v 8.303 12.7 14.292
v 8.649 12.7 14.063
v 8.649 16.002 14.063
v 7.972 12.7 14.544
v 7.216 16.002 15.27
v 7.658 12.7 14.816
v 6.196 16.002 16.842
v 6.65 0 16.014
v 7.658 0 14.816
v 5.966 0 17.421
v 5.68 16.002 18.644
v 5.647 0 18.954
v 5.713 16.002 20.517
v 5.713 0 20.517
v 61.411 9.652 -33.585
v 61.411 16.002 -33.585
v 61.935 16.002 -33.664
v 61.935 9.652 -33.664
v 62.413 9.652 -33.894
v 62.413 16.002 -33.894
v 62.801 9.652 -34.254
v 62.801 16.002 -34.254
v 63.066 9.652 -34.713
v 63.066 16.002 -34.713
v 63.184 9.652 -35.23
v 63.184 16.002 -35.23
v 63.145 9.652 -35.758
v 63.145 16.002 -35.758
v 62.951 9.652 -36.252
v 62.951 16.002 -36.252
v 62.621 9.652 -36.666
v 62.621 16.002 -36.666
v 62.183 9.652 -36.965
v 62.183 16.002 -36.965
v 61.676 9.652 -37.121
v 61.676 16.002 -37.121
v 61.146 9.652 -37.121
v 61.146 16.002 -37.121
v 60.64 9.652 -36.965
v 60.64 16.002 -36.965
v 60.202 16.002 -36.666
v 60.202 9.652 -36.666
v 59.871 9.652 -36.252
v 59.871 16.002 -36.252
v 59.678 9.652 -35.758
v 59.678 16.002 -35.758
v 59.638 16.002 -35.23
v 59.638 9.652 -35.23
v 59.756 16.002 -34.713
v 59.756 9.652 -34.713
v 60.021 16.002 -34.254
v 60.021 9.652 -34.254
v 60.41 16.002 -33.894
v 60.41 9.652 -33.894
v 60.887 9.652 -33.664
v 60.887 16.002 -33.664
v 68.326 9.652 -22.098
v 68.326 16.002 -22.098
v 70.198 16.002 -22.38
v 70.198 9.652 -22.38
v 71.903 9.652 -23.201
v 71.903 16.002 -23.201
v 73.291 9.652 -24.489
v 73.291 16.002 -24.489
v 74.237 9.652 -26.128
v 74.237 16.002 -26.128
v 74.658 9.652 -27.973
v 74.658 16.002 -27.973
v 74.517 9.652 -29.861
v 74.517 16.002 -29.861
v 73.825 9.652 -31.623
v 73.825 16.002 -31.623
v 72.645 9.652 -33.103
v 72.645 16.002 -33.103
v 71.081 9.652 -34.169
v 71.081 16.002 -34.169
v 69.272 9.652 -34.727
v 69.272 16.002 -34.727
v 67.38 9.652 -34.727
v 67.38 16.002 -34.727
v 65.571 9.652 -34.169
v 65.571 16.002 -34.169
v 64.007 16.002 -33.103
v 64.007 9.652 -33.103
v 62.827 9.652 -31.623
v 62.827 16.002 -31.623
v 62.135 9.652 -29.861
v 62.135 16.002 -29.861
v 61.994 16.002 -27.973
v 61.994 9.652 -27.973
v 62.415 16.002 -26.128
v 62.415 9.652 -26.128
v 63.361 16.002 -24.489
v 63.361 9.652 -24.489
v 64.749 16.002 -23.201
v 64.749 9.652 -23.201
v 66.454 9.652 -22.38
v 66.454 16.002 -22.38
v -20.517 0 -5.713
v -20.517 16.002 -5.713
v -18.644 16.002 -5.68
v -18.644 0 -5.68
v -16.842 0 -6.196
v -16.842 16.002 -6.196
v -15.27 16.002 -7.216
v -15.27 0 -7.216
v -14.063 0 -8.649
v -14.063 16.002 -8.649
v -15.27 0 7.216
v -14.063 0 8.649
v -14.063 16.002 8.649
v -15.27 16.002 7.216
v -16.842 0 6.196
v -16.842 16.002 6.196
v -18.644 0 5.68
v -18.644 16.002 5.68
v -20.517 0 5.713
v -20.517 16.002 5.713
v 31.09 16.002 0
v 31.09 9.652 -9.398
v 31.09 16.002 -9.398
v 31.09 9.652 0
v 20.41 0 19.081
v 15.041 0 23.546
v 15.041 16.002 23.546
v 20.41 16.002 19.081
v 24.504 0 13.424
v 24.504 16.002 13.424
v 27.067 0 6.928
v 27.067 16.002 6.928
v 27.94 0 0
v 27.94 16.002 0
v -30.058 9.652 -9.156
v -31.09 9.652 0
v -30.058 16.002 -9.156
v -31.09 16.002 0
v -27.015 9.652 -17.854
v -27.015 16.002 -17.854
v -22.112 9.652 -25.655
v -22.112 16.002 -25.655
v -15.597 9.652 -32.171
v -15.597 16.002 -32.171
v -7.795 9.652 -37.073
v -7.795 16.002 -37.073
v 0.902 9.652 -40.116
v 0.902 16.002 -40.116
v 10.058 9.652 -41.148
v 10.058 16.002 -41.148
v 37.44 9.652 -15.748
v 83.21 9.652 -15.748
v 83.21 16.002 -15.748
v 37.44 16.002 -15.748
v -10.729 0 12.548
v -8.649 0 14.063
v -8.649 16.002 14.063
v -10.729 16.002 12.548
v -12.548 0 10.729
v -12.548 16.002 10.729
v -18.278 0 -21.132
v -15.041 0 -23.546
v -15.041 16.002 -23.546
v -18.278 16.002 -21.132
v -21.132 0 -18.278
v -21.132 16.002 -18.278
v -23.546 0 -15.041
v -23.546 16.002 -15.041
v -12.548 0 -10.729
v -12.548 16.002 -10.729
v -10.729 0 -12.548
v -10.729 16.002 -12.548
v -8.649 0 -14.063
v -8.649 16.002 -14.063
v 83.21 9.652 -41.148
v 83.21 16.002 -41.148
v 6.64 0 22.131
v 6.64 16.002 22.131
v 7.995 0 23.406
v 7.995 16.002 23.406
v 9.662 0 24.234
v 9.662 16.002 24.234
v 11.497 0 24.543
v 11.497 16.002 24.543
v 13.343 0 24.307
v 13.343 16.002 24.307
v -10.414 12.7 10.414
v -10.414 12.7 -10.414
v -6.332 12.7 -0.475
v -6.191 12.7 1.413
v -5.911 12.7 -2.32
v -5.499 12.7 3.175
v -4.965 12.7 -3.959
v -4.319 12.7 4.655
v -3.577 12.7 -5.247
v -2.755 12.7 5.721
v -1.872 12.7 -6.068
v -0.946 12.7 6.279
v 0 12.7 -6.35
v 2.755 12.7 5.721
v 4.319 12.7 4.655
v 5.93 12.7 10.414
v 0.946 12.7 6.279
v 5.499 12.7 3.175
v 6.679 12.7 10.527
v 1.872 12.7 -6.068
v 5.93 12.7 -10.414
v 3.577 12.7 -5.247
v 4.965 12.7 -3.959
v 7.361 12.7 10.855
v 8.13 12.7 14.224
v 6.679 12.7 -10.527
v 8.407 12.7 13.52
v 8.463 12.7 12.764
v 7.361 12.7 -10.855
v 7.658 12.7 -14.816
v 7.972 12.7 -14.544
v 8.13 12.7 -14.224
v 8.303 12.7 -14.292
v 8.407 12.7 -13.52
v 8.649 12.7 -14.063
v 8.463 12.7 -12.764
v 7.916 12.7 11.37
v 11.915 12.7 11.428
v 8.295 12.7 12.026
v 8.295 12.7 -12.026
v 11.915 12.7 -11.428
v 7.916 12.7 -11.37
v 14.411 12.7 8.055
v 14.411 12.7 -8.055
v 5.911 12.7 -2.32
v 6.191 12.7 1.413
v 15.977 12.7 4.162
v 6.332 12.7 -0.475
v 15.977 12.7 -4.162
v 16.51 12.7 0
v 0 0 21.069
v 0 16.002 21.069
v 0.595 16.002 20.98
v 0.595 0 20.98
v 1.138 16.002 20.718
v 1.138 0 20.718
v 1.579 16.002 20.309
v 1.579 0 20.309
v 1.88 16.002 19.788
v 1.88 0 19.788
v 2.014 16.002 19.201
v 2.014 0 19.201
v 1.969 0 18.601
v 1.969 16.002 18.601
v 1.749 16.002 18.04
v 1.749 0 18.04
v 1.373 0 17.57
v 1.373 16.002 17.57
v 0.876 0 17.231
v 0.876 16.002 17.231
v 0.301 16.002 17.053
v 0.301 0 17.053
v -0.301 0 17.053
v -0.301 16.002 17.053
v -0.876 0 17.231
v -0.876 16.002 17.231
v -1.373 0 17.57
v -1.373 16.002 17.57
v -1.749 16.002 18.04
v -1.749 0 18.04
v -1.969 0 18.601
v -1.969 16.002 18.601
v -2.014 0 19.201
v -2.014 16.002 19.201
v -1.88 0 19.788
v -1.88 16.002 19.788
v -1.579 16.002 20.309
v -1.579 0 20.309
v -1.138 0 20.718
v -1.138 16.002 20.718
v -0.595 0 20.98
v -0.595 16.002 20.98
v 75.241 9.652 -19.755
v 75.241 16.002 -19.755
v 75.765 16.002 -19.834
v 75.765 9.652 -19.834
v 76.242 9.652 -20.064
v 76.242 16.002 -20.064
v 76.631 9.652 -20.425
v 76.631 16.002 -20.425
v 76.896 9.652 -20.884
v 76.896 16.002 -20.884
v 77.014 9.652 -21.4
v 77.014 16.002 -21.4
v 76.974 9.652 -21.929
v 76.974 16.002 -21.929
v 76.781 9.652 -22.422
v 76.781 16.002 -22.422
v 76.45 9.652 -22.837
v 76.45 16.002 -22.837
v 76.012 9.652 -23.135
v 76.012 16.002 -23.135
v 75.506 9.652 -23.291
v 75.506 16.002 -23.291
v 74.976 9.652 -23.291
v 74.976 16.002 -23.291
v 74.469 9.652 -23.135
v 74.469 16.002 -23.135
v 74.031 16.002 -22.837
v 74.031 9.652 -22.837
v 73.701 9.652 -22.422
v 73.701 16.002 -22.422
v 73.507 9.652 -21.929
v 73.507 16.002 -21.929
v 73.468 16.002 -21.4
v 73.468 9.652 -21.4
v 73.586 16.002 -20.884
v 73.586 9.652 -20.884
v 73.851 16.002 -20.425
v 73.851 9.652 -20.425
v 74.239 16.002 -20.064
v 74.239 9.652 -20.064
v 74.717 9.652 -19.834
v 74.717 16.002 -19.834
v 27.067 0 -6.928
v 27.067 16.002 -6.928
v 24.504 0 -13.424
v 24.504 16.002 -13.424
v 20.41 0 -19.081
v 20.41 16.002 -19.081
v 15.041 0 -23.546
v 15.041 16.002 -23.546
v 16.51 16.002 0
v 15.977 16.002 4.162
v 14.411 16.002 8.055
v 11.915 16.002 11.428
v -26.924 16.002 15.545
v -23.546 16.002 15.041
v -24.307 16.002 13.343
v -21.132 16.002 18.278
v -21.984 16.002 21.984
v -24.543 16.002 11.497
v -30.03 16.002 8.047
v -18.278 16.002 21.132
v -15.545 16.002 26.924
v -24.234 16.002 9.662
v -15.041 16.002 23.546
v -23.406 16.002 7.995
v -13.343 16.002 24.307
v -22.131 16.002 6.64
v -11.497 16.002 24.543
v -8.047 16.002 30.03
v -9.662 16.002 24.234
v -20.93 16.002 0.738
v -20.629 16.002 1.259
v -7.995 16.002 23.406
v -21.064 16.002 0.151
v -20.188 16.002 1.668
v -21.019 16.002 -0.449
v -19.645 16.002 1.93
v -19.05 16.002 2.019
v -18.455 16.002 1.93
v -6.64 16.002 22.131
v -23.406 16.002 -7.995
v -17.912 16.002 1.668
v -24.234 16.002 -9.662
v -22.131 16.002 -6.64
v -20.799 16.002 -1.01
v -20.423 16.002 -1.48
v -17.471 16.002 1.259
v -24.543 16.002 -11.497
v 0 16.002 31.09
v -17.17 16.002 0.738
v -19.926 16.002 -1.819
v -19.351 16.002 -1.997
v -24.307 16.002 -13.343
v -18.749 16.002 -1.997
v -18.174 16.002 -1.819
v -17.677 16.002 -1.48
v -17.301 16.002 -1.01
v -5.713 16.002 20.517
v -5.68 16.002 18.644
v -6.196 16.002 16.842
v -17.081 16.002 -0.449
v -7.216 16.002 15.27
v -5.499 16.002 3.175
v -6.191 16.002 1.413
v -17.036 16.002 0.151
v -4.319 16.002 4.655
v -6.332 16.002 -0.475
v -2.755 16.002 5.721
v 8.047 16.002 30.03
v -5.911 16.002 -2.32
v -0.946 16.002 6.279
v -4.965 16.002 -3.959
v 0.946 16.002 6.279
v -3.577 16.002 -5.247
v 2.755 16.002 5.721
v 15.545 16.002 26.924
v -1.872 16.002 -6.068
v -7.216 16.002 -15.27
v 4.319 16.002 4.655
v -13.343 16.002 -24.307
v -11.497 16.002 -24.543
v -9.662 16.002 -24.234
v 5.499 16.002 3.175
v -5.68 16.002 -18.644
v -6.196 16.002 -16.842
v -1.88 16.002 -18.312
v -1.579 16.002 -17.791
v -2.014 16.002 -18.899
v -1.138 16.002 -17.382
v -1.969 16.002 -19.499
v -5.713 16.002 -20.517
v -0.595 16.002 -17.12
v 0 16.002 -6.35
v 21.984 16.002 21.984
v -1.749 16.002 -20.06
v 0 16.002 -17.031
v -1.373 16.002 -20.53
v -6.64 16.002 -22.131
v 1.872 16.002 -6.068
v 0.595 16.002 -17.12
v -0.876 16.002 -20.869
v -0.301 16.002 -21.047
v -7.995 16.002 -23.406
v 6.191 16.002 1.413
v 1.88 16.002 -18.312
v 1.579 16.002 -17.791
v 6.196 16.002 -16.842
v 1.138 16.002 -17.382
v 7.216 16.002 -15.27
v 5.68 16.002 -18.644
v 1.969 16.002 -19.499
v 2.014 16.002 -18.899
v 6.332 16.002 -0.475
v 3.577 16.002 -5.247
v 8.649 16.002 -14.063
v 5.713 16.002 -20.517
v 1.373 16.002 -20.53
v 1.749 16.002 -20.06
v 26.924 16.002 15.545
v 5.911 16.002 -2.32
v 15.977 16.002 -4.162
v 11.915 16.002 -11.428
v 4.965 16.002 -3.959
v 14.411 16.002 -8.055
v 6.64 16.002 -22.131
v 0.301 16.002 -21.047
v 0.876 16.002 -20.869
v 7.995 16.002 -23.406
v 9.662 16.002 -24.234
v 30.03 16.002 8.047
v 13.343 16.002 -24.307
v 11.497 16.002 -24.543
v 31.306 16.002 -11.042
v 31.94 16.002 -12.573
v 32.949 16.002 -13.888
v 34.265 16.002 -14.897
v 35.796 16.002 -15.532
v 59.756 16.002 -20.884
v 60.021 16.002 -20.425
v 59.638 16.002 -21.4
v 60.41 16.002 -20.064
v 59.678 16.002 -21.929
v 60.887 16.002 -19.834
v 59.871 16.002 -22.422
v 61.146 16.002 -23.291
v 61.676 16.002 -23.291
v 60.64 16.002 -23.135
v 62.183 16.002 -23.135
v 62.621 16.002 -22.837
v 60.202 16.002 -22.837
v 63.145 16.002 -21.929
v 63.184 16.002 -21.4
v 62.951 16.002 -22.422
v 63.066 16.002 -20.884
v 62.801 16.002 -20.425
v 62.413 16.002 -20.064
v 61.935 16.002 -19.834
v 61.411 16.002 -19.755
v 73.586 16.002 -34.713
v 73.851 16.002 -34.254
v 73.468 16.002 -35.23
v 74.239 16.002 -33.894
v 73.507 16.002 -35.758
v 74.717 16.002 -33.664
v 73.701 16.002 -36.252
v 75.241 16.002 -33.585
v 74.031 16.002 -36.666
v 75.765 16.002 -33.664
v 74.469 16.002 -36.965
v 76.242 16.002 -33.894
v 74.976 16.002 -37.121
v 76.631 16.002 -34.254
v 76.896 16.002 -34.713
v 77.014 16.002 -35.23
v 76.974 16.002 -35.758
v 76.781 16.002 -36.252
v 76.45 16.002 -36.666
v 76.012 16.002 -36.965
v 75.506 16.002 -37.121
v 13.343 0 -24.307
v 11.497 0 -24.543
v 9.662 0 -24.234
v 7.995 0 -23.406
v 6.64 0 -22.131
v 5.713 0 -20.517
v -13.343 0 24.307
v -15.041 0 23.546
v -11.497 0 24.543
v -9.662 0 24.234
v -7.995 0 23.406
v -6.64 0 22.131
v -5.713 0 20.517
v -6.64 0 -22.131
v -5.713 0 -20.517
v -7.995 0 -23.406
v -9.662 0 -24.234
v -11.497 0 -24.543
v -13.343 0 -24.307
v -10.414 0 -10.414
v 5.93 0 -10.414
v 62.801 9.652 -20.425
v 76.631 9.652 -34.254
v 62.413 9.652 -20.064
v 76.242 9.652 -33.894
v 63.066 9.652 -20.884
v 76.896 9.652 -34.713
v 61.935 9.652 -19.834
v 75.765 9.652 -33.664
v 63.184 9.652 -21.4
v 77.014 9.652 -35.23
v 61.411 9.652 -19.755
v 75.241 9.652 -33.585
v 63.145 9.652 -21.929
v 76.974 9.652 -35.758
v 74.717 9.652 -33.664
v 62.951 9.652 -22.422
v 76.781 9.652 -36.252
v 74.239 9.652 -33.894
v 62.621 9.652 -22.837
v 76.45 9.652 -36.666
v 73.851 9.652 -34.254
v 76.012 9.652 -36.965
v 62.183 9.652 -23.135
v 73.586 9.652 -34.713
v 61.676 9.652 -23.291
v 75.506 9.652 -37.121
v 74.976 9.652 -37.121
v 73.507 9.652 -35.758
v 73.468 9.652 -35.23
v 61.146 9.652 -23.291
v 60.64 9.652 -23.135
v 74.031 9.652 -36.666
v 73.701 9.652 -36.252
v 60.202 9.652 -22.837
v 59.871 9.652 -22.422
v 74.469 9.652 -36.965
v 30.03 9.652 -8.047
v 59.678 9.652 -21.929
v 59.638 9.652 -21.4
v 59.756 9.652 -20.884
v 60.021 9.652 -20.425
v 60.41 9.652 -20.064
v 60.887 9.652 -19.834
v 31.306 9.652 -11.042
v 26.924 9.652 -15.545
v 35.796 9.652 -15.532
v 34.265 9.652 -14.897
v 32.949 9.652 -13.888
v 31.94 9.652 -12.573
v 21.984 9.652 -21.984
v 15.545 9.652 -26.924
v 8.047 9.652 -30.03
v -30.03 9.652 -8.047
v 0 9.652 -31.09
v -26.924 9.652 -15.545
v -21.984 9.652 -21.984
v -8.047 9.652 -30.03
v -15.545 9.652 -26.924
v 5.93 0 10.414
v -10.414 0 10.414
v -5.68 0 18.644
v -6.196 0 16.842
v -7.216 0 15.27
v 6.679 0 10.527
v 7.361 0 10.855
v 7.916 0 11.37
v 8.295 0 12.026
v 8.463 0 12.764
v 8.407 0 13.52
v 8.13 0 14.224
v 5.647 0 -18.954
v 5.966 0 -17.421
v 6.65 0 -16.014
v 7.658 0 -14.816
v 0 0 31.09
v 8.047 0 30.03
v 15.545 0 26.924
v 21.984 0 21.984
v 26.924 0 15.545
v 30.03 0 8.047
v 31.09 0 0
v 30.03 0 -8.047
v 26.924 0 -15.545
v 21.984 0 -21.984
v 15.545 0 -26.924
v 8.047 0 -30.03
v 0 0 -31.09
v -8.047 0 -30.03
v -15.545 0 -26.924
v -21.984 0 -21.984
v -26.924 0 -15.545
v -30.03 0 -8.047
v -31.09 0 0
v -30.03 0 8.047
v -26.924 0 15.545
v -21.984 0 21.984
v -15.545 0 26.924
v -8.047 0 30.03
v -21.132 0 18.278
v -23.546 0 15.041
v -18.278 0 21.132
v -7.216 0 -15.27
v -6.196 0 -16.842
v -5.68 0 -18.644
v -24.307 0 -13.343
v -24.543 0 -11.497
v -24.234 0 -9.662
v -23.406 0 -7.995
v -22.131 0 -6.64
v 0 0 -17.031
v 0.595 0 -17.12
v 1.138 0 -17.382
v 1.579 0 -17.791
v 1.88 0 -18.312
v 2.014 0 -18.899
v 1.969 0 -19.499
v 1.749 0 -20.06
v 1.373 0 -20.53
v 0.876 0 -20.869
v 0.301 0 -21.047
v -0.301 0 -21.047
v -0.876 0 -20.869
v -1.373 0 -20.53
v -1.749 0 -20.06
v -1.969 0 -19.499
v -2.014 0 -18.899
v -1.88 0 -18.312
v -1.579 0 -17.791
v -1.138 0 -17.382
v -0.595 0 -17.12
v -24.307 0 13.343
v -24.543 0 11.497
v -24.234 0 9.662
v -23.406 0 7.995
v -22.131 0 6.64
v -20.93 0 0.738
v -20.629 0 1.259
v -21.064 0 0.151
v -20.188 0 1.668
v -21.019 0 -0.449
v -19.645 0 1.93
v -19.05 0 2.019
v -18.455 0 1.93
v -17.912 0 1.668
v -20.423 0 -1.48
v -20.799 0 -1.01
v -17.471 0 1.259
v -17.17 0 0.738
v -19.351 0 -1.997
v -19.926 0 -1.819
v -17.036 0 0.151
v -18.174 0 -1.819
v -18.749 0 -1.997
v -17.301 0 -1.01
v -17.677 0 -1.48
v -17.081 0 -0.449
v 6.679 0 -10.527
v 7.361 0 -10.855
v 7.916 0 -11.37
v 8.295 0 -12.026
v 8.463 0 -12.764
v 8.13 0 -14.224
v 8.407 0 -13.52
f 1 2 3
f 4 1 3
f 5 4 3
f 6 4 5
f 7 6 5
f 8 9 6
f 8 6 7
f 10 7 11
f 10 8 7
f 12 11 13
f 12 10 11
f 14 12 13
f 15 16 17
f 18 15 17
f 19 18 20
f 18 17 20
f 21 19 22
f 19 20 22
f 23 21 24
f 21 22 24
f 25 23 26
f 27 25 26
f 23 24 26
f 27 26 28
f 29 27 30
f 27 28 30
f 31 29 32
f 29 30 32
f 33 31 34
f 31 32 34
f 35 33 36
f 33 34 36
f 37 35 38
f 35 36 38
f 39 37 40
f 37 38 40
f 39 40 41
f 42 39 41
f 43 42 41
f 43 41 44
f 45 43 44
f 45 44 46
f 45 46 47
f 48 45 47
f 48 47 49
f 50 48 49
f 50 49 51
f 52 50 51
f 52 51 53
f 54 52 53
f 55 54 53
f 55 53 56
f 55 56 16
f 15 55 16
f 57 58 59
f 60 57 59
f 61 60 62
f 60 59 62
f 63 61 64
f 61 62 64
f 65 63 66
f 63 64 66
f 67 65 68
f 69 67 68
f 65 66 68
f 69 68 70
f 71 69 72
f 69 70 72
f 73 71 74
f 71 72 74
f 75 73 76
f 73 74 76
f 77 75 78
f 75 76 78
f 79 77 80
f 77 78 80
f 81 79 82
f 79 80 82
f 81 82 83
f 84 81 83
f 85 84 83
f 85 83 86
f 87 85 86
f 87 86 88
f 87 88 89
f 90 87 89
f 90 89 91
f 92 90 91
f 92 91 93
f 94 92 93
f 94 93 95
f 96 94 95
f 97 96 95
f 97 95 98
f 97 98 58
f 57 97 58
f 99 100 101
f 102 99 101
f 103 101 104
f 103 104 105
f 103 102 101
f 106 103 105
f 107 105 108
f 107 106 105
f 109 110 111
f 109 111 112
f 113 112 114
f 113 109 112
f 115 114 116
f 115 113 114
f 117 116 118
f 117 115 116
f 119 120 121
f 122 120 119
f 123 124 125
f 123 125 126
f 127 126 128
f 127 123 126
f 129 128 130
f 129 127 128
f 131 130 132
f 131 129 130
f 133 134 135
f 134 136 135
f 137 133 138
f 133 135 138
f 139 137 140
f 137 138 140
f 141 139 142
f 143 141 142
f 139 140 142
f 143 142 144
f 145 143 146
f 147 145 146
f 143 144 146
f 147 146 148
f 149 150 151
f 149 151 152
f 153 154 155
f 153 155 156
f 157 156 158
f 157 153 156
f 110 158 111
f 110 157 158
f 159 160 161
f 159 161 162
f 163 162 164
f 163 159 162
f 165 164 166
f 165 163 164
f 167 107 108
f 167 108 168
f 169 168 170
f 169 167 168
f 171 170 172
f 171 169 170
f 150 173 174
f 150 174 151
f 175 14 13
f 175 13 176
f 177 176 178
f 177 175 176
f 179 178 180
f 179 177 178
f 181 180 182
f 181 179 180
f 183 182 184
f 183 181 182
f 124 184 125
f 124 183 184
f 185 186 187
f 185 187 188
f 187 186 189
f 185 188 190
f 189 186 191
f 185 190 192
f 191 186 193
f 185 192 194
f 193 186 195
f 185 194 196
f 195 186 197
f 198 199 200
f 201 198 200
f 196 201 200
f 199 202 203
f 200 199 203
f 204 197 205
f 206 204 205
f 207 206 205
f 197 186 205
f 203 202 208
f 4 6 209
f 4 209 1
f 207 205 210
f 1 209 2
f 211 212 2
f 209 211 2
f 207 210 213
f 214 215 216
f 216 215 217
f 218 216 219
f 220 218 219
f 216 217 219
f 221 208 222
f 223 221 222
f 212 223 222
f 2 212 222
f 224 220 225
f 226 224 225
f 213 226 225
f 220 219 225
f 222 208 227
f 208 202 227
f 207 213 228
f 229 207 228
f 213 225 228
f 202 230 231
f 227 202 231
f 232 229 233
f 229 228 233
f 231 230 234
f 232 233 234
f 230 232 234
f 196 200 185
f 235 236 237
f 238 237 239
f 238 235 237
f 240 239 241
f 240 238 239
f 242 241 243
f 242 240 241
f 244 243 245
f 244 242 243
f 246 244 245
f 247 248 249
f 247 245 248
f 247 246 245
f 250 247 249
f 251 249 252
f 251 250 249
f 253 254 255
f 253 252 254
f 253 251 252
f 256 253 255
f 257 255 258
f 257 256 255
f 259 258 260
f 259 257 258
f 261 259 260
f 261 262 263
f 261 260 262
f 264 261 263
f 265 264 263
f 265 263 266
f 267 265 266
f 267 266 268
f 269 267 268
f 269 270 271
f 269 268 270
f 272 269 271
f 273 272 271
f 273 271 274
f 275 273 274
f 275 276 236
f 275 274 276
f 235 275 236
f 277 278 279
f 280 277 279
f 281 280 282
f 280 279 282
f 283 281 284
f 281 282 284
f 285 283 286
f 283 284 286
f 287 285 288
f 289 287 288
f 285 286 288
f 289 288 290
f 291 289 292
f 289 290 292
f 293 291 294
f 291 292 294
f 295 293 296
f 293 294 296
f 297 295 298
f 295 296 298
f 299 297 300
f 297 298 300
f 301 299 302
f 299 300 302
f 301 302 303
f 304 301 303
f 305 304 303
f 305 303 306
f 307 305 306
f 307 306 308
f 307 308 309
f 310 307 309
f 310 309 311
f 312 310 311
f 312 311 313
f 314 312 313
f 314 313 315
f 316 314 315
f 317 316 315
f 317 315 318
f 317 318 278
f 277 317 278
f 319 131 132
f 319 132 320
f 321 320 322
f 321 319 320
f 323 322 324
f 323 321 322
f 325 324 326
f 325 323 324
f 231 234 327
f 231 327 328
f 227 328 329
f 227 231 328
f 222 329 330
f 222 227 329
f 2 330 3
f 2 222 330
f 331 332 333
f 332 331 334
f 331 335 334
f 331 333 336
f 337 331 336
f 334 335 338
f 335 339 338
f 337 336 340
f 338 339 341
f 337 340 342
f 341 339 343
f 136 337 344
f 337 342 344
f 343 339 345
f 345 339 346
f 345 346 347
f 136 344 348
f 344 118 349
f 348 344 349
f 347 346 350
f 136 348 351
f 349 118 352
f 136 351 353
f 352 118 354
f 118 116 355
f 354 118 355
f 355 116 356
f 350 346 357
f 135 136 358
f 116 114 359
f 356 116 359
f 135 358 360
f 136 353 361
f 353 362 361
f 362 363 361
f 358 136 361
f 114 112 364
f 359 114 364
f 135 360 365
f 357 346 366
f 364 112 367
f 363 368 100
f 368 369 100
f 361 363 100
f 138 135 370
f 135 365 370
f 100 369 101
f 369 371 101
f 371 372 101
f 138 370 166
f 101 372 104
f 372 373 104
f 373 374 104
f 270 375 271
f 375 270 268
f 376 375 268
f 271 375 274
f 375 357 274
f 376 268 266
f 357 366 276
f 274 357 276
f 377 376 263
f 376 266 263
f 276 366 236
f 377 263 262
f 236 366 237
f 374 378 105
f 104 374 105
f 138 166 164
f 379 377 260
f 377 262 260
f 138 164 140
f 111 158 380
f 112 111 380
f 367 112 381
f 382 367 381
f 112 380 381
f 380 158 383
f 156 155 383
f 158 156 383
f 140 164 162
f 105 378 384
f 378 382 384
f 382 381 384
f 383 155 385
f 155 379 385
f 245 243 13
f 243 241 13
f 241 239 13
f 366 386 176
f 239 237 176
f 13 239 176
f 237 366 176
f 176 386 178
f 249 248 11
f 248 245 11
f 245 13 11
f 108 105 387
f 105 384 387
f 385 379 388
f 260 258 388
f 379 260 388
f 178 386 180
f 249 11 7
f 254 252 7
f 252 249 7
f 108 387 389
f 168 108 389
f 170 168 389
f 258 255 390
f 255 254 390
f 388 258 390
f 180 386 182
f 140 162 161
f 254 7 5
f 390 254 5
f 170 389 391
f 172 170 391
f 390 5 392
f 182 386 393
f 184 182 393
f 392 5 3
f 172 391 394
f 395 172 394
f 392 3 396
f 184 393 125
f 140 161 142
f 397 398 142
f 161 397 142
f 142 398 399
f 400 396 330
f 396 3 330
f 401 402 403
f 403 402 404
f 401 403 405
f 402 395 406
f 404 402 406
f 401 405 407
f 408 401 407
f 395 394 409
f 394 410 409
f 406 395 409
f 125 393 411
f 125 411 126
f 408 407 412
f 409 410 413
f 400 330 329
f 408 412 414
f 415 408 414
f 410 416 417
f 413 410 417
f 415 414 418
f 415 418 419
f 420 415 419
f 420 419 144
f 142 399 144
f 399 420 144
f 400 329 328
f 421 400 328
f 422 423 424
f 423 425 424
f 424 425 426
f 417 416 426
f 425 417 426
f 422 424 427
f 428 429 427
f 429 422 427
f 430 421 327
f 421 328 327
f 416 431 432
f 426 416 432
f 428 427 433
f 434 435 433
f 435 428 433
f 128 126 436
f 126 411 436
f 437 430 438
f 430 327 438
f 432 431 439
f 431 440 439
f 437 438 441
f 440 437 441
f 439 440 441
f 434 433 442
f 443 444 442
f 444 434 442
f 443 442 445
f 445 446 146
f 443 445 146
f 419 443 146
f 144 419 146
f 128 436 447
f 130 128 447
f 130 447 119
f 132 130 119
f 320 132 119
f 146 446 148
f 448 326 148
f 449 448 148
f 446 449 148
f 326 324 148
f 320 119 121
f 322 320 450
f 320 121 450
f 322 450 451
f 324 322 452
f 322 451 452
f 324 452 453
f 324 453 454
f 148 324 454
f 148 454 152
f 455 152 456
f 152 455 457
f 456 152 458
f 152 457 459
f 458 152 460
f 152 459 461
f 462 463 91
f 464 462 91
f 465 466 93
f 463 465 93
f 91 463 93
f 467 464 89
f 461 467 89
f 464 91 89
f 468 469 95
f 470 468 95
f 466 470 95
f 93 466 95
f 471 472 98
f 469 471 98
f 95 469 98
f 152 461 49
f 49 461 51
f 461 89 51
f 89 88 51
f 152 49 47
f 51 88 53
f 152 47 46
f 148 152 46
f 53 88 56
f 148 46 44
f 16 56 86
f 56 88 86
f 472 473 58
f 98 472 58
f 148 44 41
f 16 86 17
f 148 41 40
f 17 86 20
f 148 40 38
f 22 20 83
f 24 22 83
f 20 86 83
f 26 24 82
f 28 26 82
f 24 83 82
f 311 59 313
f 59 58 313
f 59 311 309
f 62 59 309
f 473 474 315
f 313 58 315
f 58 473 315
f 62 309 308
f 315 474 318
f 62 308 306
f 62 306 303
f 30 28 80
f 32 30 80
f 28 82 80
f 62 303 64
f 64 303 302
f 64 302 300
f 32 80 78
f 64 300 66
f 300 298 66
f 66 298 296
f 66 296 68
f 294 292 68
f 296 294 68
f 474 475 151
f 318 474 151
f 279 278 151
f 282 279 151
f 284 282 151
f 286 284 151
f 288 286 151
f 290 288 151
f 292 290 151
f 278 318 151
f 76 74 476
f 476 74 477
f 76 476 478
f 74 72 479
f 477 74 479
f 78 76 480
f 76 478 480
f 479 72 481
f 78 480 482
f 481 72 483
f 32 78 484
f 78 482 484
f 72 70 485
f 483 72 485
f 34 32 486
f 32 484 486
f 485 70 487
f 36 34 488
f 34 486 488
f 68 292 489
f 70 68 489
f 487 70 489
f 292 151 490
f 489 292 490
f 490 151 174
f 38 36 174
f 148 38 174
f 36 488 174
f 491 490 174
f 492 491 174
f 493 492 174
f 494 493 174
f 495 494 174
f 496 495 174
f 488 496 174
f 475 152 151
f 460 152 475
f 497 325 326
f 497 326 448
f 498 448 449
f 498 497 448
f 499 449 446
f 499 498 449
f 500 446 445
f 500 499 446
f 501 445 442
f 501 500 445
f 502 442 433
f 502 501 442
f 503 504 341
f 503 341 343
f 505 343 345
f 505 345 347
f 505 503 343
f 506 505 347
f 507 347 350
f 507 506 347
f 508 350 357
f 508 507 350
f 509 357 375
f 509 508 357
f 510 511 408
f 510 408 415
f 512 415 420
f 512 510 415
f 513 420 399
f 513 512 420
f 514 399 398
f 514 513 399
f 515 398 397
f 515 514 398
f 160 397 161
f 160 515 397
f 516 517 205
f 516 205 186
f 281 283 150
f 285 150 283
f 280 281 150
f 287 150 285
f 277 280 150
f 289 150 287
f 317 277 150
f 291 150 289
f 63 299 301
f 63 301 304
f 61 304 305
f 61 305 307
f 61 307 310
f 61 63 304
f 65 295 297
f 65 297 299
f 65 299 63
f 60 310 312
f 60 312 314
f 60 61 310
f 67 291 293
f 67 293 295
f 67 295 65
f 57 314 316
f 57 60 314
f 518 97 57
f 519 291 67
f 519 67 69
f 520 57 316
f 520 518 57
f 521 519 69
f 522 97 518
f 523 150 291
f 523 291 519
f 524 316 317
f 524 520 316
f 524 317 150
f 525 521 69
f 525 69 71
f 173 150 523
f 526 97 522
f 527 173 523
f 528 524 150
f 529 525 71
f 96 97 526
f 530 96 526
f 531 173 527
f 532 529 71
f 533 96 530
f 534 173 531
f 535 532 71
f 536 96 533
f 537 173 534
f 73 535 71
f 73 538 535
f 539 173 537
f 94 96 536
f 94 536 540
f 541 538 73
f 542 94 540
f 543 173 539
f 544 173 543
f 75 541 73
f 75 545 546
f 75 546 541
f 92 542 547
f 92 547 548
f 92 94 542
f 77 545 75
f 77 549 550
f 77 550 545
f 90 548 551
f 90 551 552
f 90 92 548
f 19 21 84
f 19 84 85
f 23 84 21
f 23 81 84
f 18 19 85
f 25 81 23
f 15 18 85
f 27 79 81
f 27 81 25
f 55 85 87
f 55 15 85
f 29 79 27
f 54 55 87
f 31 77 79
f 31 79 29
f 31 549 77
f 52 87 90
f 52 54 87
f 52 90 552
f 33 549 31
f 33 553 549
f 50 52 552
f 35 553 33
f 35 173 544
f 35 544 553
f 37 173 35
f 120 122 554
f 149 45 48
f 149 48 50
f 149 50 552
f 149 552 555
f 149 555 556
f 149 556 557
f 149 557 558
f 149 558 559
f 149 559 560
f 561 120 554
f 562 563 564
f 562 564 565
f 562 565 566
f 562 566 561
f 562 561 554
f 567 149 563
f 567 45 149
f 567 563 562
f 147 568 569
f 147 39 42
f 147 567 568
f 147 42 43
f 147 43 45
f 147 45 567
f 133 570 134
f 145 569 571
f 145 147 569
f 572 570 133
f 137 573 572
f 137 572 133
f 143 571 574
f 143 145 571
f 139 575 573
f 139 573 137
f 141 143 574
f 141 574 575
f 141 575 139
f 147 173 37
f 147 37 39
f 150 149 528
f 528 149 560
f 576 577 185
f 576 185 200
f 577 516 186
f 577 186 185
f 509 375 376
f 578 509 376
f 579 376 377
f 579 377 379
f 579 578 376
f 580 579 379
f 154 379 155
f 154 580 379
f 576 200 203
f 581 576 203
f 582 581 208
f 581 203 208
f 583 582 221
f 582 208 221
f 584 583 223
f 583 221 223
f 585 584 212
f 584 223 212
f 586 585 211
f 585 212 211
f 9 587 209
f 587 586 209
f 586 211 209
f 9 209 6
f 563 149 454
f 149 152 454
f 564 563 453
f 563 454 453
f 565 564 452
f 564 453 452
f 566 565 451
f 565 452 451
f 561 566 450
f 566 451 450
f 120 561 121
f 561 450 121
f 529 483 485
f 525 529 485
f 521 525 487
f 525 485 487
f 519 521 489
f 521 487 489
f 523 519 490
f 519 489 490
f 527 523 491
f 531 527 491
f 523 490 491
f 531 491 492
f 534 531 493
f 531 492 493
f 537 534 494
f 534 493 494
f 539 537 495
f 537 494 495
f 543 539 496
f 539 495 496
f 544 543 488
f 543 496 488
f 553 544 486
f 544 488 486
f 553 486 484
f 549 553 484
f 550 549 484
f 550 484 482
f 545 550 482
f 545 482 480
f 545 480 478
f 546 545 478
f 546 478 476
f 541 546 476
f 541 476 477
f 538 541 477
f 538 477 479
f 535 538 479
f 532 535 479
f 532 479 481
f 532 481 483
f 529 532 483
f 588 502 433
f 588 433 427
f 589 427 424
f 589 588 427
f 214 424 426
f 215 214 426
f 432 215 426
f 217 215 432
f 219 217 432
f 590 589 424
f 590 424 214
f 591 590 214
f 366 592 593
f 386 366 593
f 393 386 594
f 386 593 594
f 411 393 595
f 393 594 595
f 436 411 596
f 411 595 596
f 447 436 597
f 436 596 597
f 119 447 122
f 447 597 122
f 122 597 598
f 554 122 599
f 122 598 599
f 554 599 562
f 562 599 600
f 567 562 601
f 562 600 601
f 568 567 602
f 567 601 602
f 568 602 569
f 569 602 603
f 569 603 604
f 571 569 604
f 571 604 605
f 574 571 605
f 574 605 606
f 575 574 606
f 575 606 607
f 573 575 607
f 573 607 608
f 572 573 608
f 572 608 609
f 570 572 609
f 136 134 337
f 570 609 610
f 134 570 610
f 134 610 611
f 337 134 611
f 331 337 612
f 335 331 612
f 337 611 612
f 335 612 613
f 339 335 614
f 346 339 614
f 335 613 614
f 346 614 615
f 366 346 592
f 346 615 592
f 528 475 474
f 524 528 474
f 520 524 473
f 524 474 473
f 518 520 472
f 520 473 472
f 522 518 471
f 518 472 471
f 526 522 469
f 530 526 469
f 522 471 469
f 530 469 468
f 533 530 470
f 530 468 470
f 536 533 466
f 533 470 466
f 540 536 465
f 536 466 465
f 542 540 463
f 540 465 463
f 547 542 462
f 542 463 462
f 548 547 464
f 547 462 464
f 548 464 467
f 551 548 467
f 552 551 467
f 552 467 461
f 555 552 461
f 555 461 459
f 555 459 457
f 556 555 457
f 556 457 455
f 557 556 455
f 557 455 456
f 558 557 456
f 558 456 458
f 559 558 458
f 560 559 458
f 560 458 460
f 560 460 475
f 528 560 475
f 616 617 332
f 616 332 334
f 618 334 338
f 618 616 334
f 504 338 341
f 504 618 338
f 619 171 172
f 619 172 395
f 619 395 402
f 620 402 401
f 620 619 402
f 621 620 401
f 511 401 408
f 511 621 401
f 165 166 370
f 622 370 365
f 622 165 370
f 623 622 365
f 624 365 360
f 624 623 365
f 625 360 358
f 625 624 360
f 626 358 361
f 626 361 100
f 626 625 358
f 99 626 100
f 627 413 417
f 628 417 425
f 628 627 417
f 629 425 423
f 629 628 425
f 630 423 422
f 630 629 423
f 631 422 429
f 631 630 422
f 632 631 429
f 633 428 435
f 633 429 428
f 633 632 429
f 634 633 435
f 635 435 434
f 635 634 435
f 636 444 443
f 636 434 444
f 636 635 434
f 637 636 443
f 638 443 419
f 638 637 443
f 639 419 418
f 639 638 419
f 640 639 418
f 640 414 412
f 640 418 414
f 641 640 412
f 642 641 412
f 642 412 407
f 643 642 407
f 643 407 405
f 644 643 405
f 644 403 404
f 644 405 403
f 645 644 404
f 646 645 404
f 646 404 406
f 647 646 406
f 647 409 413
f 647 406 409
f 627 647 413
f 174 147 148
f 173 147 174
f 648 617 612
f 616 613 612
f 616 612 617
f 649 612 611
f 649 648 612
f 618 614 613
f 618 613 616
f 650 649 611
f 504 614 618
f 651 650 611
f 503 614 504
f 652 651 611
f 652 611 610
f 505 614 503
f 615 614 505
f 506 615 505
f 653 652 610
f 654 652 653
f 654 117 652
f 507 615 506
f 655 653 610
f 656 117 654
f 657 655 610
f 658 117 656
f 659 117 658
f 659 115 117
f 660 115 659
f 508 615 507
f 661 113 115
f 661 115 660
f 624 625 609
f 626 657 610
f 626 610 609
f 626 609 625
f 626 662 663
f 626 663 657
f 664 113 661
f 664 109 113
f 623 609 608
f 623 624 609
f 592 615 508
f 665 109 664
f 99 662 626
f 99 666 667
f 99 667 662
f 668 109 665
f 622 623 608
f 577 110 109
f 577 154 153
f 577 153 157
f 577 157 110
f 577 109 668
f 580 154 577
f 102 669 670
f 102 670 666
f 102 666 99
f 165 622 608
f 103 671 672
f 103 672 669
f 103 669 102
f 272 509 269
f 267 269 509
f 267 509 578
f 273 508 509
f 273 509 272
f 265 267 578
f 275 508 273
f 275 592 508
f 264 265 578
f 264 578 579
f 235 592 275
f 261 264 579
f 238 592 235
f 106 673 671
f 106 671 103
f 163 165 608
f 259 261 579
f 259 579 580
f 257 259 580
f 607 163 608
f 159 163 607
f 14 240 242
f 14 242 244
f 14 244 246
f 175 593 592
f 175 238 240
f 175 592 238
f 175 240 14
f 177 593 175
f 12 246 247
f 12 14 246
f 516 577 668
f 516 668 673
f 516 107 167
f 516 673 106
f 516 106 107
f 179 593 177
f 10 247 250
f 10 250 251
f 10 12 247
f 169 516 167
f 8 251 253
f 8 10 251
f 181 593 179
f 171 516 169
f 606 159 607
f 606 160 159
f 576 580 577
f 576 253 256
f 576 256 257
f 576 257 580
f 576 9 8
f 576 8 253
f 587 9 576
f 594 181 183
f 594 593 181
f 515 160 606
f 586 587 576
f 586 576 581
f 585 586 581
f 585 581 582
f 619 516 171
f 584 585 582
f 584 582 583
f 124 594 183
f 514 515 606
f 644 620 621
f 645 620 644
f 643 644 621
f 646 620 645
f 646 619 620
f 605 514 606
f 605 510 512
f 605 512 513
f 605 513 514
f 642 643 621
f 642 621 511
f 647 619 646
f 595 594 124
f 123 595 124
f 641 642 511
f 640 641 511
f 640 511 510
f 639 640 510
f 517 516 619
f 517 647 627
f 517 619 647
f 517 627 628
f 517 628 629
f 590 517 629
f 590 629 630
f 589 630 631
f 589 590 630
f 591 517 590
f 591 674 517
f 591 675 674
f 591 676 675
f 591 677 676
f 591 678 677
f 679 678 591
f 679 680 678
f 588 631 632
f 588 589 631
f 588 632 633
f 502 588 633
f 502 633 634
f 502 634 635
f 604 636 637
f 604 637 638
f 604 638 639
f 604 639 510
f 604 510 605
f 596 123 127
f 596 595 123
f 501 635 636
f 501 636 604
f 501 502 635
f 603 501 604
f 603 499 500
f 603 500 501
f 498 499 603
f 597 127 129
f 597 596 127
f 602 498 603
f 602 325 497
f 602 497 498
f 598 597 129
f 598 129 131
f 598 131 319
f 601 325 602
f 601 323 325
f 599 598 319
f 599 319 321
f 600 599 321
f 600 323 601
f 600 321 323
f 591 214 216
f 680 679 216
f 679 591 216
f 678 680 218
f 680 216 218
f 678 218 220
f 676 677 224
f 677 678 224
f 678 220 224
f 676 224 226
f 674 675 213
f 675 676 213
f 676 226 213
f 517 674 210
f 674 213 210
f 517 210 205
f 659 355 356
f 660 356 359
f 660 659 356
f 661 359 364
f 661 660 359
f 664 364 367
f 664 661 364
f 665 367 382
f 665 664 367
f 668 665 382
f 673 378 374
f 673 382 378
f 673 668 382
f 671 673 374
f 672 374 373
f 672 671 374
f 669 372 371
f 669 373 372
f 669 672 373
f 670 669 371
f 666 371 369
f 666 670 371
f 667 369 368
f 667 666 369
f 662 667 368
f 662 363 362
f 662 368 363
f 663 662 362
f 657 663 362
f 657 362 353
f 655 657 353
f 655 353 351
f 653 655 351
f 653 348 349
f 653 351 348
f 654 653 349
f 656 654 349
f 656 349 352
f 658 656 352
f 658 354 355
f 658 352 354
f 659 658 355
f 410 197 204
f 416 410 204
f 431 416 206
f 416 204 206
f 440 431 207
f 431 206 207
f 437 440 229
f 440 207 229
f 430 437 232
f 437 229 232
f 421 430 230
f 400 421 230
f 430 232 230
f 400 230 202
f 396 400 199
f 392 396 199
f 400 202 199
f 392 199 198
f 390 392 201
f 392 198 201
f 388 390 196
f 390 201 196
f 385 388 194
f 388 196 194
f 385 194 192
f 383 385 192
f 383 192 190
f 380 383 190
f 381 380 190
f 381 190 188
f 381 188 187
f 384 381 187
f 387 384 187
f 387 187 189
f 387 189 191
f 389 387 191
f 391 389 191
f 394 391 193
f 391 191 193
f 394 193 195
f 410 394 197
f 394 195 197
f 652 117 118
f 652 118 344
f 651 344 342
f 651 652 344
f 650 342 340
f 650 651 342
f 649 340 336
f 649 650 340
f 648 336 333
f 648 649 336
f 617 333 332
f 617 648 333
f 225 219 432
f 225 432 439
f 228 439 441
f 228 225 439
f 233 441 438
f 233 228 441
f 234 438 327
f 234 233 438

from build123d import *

# Parameters (mm, degrees)
SKETCH1_R           = 31.0896
BOSS_EXTRUDE1_DEPTH = 16.002
BOSS_EXTRUDE2_START = -6.35
BOSS_EXTRUDE2_DEPTH = 6.35
FILLET2_R           = 6.35
CUT_EXTRUDE2_REACH  = 96.198
SKETCH4_R           = 1.778
SKETCH4_R_2         = 6.35
SKETCH7_R           = 2.0193
CUT_EXTRUDE4_DEPTH  = 95.197625109
FILLET7_R           = 6.35
FILLET8_R           = 41.148
CUT_EXTRUDE5_DEPTH  = 12.7
FILLET9_R           = 2.54
SKETCH9_R           = 6.35
CUT_EXTRUDE6_DEPTH  = 3.302


# Some blends are built 0.0001 mm under size
with BuildPart() as part:
    # Sketch1 → Boss-Extrude1 (new body)
    with BuildSketch(Plane(origin=(0, 0, 0), x_dir=(1, 0, 0), z_dir=(0, 1, 0))):
        with Locations(Location((0, 0, 0), (0, 0, 270))):
            Circle(SKETCH1_R)
    extrude(amount=BOSS_EXTRUDE1_DEPTH)

    # Sketch2 → Boss-Extrude2 (add)
    with BuildSketch(Plane(origin=(0, 16.002, 0), x_dir=(1, 0, 0), z_dir=(0, 1, 0)).offset(BOSS_EXTRUDE2_START)):
        with BuildLine():
            Line((-31.0896, 0), (-31.0896, 41.148))
            Line((-31.0896, 41.148), (83.2104, 41.148))
            Line((83.2104, 41.148), (83.2104, 15.748))
            Line((83.2104, 15.748), (31.0896, 15.748))
            Line((31.0896, 15.748), (31.0896, 0))
            ThreePointArc((31.0896, 0), (0, -31.0896), (-31.0896, 0))
        make_face()
    extrude(amount=BOSS_EXTRUDE2_DEPTH)

    # Fillet2
    fillet2_edges = [part.edges().sort_by_distance(p)[0] for p in [
        (31.0896, 12.827, -15.748),
    ]]
    fillet(fillet2_edges, radius=FILLET2_R)

    # Sketch4 → Cut-Extrude2 (cut, up to next)
    with BuildSketch(Plane(origin=(0, 16.002, 0), x_dir=(1, 0, 0), z_dir=(0, 1, 0)), mode=Mode.PRIVATE) as cut_extrude2_sk1:
        with Locations(Location((61.411202787, 35.362797213, 0), (0, 0, 270))):
            Circle(SKETCH4_R)
    cut_extrude2_tool1 = extrude(cut_extrude2_sk1.sketch, amount=-CUT_EXTRUDE2_REACH, mode=Mode.PRIVATE) & part.part
    # Sketch4 → Cut-Extrude2 (cut, up to next)
    with BuildSketch(Plane(origin=(0, 16.002, 0), x_dir=(1, 0, 0), z_dir=(0, 1, 0)), mode=Mode.PRIVATE) as cut_extrude2_sk2:
        with Locations(Location((75.240797213, 35.362797213, 0), (0, 0, 270))):
            Circle(SKETCH4_R)
    cut_extrude2_tool2 = extrude(cut_extrude2_sk2.sketch, amount=-CUT_EXTRUDE2_REACH, mode=Mode.PRIVATE) & part.part
    # Sketch4 → Cut-Extrude2 (cut, up to next)
    with BuildSketch(Plane(origin=(0, 16.002, 0), x_dir=(1, 0, 0), z_dir=(0, 1, 0)), mode=Mode.PRIVATE) as cut_extrude2_sk3:
        with Locations(Location((75.240797213, 21.533202787, 0), (0, 0, 270))):
            Circle(SKETCH4_R)
    cut_extrude2_tool3 = extrude(cut_extrude2_sk3.sketch, amount=-CUT_EXTRUDE2_REACH, mode=Mode.PRIVATE) & part.part
    # Sketch4 → Cut-Extrude2 (cut, up to next)
    with BuildSketch(Plane(origin=(0, 16.002, 0), x_dir=(1, 0, 0), z_dir=(0, 1, 0)), mode=Mode.PRIVATE) as cut_extrude2_sk4:
        with Locations(Location((68.326, 28.448, 0), (0, 0, 270))):
            Circle(SKETCH4_R_2)
    cut_extrude2_tool4 = extrude(cut_extrude2_sk4.sketch, amount=-CUT_EXTRUDE2_REACH, mode=Mode.PRIVATE) & part.part
    # Sketch4 → Cut-Extrude2 (cut, up to next)
    with BuildSketch(Plane(origin=(0, 16.002, 0), x_dir=(1, 0, 0), z_dir=(0, 1, 0)), mode=Mode.PRIVATE) as cut_extrude2_sk5:
        with Locations(Location((61.411202787, 21.533202787, 0), (0, 0, 270))):
            Circle(SKETCH4_R)
    cut_extrude2_tool5 = extrude(cut_extrude2_sk5.sketch, amount=-CUT_EXTRUDE2_REACH, mode=Mode.PRIVATE) & part.part
    add(cut_extrude2_tool1.solids().sort_by_distance((61.411203, 16.002, -35.362797))[0], mode=Mode.SUBTRACT)
    add(cut_extrude2_tool2.solids().sort_by_distance((75.240797, 16.002, -35.362797))[0], mode=Mode.SUBTRACT)
    add(cut_extrude2_tool3.solids().sort_by_distance((75.240797, 16.002, -21.533203))[0], mode=Mode.SUBTRACT)
    add(cut_extrude2_tool4.solids().sort_by_distance((68.326, 16.002, -28.448))[0], mode=Mode.SUBTRACT)
    add(cut_extrude2_tool5.solids().sort_by_distance((61.411203, 16.002, -21.533203))[0], mode=Mode.SUBTRACT)

    # Sketch7 → Cut-Extrude4 (cut, through all)
    with BuildSketch(Plane(origin=(0, 0, 0), x_dir=(1, 0, 0), z_dir=(0, 1, 0))):
        with BuildLine():
            ThreePointArc((27.94, 0), (22.235278576, 16.918510179), (7.450666667, 26.928259621))
            Line((7.450666667, 26.928259621), (4.402666667, 15.912153412))
            ThreePointArc((4.402666667, 15.912153412), (13.139028249, 9.997301469), (16.51, 0))
            ThreePointArc((16.51, 0), (13.139028249, -9.997301469), (4.402666667, -15.912153412))
            Line((4.402666667, -15.912153412), (7.450666667, -26.928259621))
            ThreePointArc((7.450666667, -26.928259621), (22.235278576, -16.918510179), (27.94, 0))
        make_face()
        with BuildLine():
            Line((-15.912153412, -4.402666667), (-26.928259621, -7.450666667))
            ThreePointArc((-26.928259621, -7.450666667), (-19.756563466, -19.756563466), (-7.450666667, -26.928259621))
            Line((-7.450666667, -26.928259621), (-4.402666667, -15.912153412))
            ThreePointArc((-4.402666667, -15.912153412), (-11.674332957, -11.674332957), (-15.912153412, -4.402666667))
        make_face()
        with BuildLine():
            Line((-4.402666667, 15.912153412), (-7.450666667, 26.928259621))
            ThreePointArc((-7.450666667, 26.928259621), (-19.756563466, 19.756563466), (-26.928259621, 7.450666667))
            Line((-26.928259621, 7.450666667), (-15.912153412, 4.402666667))
            ThreePointArc((-15.912153412, 4.402666667), (-11.674332957, 11.674332957), (-4.402666667, 15.912153412))
        make_face()
        with Locations(Location((-19.05, 0, 0), (0, 0, 270))):
            Circle(SKETCH7_R)
        with Locations(Location((0, -19.05, 0), (0, 0, 270))):
            Circle(SKETCH7_R)
        with Locations(Location((0, 19.05, 0), (0, 0, 270))):
            Circle(SKETCH7_R)
    extrude(amount=CUT_EXTRUDE4_DEPTH, mode=Mode.SUBTRACT)

    # Fillet7
    # the kernel refuses this fillet: 6.35 mm, written as the material it adds along each edge
    with BuildSketch(Plane(origin=(-26.928259621, 0, -7.450666667), x_dir=(0.40702884348062, 0, -0.9134153056385845), z_dir=(0, 1, 0)), Plane(origin=(-7.450666667, 0, 26.928259621), x_dir=(-0.9134153056385848, 0, -0.40702884348061963), z_dir=(0, 1, 0))) as fillet7_piece_1:
        with BuildLine():
            CenterArc((7.365726845, -6.279391075), FILLET7_R, 81.447682412, 107.104635177)
            Line((1.086335771, -7.223715029), (0, 0))
            ThreePointArc((0, 0), (4.1550254, 0.310679271), (8.3100508, 0))
        make_face()
    extrude(amount=16.002)
    with BuildSketch(Plane(origin=(-7.450666667, 0, -26.928259621), x_dir=(0.26666666666666705, 0, 0.9637888196533972), z_dir=(0, 1, 0)), Plane(origin=(7.450666667, 0, 26.928259621), x_dir=(-0.26666666666666733, 0, -0.9637888196533971), z_dir=(0, 1, 0)), Plane(origin=(-26.928259621, 0, 7.450666667), x_dir=(0.9637888196533975, 0, -0.26666666666666644), z_dir=(0, 1, 0))) as fillet7_piece_2:
        with BuildLine():
            CenterArc((7.304942452, -6.35), FILLET7_R, 90, 107.104635177)
            ThreePointArc((1.235807879, -8.217647059), (0.310679271, -4.1550254), (0, 0))
            Line((0, 0), (7.304942452, 0))
        make_face()
    extrude(amount=16.002)
    with BuildSketch(Plane(origin=(-4.402666667, 0, -15.912153412), x_dir=(-0.916852417954672, 0, 0.39922630636103035), z_dir=(0, 1, 0)), Plane(origin=(4.402666667, 0, 15.912153412), x_dir=(0.9168524179546733, 0, -0.39922630636102746), z_dir=(0, 1, 0)), Plane(origin=(-15.912153412, 0, 4.402666667), x_dir=(0.39922630636102946, 0, 0.9168524179546725), z_dir=(0, 1, 0))) as fillet7_piece_3:
        with BuildLine():
            CenterArc((5.522661099, -6.287214109), FILLET7_R, 98.063810107, 73.872379787)
            Line((-0.76455301, -5.396462319), (0, 0))
            ThreePointArc((0, 0), (2.315954654, -0.163243317), (4.631909309, 0))
        make_face()
    extrude(amount=16.002)
    with BuildSketch(Plane(origin=(4.402666667, 0, -15.912153412), x_dir=(0.26666666666666416, 0, -0.9637888196533979), z_dir=(0, 1, 0))) as fillet7_piece_4:
        with BuildLine():
            CenterArc((5.450352912, -6.35), FILLET7_R, 90, 73.872379787)
            ThreePointArc((-0.649745119, -4.586111111), (-0.163243317, -2.315954654), (0, 0))
            Line((0, 0), (5.450352912, 0))
        make_face()
    extrude(amount=16.002)
    with BuildSketch(Plane(origin=(7.450666667, 0, -26.928259621), x_dir=(-0.2666666666666666, 0, 0.9637888196533974), z_dir=(0, 1, 0))) as fillet7_piece_5:
        with BuildLine():
            CenterArc((7.304942452, 6.35), FILLET7_R, 162.895364823, 107.104635177)
            ThreePointArc((1.235807879, 8.217647059), (0.310679271, 4.1550254), (0, 0))
            Line((0, 0), (7.304942452, 0))
        make_face()
    extrude(amount=16.002)
    with BuildSketch(Plane(origin=(-4.402666667, 0, 15.912153412), x_dir=(-0.9168524179546729, 0, -0.3992263063610288), z_dir=(0, 1, 0)), Plane(origin=(-15.912153412, 0, -4.402666667), x_dir=(0.39922630636102996, 0, -0.9168524179546723), z_dir=(0, 1, 0))) as fillet7_piece_6:
        with BuildLine():
            CenterArc((5.522661099, 6.287214109), FILLET7_R, 188.063810107, 73.872379787)
            Line((-0.76455301, 5.396462319), (0, 0))
            ThreePointArc((0, 0), (2.315954654, 0.163243317), (4.631909309, 0))
        make_face()
    extrude(amount=16.002)

    # Fillet8
    fillet8_edges = [part.edges().sort_by_distance(p)[0] for p in [
        (-31.0896, 12.827, -41.148),
    ]]
    fillet(fillet8_edges, radius=FILLET8_R - 0.0001)  # a hair under: the kernel refuses the full size

    # Sketch8 → Cut-Extrude5 (cut)
    with BuildSketch(Plane.XZ):
        with BuildLine():
            Line((-10.414, 10.414), (10.414, 10.414))
            ThreePointArc((10.414, 10.414), (20.828, 0), (10.414, -10.414))
            Line((10.414, -10.414), (-10.414, -10.414))
            Line((-10.414, -10.414), (-10.414, 10.414))
        make_face()
    extrude(amount=-CUT_EXTRUDE5_DEPTH, mode=Mode.SUBTRACT)

    # Fillet9
    # the kernel refuses this fillet: 2.54 mm, written as the material it takes off along each edge
    with BuildSketch(Plane(origin=(13.087195122, 12.7, 10.065059555), x_dir=(-0.7525451578932851, 0, 0.658540648199768), z_dir=(0, -1, 0))) as fillet9_piece_1:
        with BuildLine():
            CenterArc((7.288242174, 2.538935053), FILLET9_R, 131.188669075, 137.152126286)
            Line((5.615548928, 4.450399754), (5.448279603, 4.641546224))
            ThreePointArc((5.448279603, 4.641546224), (2.074222188, 1.688960676), (-0.1125988, 0.227678524))
            Line((-0.1125988, 0.227678524), (-0.049545453, -0.249120951))
            ThreePointArc((-0.049545453, -0.249120951), (6.014734512, -0.336617786), (7.207343199, -0.253893505))
            Line((7.207343199, -0.253893505), (7.214697651, 0))
        make_face()
    extrude(amount=30.736744128, mode=Mode.SUBTRACT)
    with BuildSketch(Plane(origin=(13.087195122, 12.7, -10.065059555), x_dir=(-0.7525451578933744, 0, -0.658540648199666), z_dir=(0, -1, 0))) as fillet9_piece_2:
        with BuildLine():
            CenterArc((7.288242174, -2.538935053), FILLET9_R, 91.659204639, 137.152126286)
            Line((5.615548928, -4.450399754), (5.448279603, -4.641546224))
            ThreePointArc((5.448279603, -4.641546224), (2.074222188, -1.688960676), (-0.1125988, -0.227678524))
            Line((-0.1125988, -0.227678524), (-0.049545453, 0.249120951))
            ThreePointArc((-0.049545453, 0.249120951), (6.014734512, 0.336617786), (7.207343199, 0.253893505))
            Line((7.207343199, 0.253893505), (7.214697651, 0))
        make_face()
    extrude(amount=30.736744128, mode=Mode.SUBTRACT)

    # Sketch9 → Cut-Extrude6 (cut)
    with BuildSketch(Plane.XZ.offset(-12.7)):
        with Locations(Location((0, 0, 0), (0, 0, 270))):
            Circle(SKETCH9_R)
    extrude(amount=-CUT_EXTRUDE6_DEPTH, mode=Mode.SUBTRACT)


solid = part.part
